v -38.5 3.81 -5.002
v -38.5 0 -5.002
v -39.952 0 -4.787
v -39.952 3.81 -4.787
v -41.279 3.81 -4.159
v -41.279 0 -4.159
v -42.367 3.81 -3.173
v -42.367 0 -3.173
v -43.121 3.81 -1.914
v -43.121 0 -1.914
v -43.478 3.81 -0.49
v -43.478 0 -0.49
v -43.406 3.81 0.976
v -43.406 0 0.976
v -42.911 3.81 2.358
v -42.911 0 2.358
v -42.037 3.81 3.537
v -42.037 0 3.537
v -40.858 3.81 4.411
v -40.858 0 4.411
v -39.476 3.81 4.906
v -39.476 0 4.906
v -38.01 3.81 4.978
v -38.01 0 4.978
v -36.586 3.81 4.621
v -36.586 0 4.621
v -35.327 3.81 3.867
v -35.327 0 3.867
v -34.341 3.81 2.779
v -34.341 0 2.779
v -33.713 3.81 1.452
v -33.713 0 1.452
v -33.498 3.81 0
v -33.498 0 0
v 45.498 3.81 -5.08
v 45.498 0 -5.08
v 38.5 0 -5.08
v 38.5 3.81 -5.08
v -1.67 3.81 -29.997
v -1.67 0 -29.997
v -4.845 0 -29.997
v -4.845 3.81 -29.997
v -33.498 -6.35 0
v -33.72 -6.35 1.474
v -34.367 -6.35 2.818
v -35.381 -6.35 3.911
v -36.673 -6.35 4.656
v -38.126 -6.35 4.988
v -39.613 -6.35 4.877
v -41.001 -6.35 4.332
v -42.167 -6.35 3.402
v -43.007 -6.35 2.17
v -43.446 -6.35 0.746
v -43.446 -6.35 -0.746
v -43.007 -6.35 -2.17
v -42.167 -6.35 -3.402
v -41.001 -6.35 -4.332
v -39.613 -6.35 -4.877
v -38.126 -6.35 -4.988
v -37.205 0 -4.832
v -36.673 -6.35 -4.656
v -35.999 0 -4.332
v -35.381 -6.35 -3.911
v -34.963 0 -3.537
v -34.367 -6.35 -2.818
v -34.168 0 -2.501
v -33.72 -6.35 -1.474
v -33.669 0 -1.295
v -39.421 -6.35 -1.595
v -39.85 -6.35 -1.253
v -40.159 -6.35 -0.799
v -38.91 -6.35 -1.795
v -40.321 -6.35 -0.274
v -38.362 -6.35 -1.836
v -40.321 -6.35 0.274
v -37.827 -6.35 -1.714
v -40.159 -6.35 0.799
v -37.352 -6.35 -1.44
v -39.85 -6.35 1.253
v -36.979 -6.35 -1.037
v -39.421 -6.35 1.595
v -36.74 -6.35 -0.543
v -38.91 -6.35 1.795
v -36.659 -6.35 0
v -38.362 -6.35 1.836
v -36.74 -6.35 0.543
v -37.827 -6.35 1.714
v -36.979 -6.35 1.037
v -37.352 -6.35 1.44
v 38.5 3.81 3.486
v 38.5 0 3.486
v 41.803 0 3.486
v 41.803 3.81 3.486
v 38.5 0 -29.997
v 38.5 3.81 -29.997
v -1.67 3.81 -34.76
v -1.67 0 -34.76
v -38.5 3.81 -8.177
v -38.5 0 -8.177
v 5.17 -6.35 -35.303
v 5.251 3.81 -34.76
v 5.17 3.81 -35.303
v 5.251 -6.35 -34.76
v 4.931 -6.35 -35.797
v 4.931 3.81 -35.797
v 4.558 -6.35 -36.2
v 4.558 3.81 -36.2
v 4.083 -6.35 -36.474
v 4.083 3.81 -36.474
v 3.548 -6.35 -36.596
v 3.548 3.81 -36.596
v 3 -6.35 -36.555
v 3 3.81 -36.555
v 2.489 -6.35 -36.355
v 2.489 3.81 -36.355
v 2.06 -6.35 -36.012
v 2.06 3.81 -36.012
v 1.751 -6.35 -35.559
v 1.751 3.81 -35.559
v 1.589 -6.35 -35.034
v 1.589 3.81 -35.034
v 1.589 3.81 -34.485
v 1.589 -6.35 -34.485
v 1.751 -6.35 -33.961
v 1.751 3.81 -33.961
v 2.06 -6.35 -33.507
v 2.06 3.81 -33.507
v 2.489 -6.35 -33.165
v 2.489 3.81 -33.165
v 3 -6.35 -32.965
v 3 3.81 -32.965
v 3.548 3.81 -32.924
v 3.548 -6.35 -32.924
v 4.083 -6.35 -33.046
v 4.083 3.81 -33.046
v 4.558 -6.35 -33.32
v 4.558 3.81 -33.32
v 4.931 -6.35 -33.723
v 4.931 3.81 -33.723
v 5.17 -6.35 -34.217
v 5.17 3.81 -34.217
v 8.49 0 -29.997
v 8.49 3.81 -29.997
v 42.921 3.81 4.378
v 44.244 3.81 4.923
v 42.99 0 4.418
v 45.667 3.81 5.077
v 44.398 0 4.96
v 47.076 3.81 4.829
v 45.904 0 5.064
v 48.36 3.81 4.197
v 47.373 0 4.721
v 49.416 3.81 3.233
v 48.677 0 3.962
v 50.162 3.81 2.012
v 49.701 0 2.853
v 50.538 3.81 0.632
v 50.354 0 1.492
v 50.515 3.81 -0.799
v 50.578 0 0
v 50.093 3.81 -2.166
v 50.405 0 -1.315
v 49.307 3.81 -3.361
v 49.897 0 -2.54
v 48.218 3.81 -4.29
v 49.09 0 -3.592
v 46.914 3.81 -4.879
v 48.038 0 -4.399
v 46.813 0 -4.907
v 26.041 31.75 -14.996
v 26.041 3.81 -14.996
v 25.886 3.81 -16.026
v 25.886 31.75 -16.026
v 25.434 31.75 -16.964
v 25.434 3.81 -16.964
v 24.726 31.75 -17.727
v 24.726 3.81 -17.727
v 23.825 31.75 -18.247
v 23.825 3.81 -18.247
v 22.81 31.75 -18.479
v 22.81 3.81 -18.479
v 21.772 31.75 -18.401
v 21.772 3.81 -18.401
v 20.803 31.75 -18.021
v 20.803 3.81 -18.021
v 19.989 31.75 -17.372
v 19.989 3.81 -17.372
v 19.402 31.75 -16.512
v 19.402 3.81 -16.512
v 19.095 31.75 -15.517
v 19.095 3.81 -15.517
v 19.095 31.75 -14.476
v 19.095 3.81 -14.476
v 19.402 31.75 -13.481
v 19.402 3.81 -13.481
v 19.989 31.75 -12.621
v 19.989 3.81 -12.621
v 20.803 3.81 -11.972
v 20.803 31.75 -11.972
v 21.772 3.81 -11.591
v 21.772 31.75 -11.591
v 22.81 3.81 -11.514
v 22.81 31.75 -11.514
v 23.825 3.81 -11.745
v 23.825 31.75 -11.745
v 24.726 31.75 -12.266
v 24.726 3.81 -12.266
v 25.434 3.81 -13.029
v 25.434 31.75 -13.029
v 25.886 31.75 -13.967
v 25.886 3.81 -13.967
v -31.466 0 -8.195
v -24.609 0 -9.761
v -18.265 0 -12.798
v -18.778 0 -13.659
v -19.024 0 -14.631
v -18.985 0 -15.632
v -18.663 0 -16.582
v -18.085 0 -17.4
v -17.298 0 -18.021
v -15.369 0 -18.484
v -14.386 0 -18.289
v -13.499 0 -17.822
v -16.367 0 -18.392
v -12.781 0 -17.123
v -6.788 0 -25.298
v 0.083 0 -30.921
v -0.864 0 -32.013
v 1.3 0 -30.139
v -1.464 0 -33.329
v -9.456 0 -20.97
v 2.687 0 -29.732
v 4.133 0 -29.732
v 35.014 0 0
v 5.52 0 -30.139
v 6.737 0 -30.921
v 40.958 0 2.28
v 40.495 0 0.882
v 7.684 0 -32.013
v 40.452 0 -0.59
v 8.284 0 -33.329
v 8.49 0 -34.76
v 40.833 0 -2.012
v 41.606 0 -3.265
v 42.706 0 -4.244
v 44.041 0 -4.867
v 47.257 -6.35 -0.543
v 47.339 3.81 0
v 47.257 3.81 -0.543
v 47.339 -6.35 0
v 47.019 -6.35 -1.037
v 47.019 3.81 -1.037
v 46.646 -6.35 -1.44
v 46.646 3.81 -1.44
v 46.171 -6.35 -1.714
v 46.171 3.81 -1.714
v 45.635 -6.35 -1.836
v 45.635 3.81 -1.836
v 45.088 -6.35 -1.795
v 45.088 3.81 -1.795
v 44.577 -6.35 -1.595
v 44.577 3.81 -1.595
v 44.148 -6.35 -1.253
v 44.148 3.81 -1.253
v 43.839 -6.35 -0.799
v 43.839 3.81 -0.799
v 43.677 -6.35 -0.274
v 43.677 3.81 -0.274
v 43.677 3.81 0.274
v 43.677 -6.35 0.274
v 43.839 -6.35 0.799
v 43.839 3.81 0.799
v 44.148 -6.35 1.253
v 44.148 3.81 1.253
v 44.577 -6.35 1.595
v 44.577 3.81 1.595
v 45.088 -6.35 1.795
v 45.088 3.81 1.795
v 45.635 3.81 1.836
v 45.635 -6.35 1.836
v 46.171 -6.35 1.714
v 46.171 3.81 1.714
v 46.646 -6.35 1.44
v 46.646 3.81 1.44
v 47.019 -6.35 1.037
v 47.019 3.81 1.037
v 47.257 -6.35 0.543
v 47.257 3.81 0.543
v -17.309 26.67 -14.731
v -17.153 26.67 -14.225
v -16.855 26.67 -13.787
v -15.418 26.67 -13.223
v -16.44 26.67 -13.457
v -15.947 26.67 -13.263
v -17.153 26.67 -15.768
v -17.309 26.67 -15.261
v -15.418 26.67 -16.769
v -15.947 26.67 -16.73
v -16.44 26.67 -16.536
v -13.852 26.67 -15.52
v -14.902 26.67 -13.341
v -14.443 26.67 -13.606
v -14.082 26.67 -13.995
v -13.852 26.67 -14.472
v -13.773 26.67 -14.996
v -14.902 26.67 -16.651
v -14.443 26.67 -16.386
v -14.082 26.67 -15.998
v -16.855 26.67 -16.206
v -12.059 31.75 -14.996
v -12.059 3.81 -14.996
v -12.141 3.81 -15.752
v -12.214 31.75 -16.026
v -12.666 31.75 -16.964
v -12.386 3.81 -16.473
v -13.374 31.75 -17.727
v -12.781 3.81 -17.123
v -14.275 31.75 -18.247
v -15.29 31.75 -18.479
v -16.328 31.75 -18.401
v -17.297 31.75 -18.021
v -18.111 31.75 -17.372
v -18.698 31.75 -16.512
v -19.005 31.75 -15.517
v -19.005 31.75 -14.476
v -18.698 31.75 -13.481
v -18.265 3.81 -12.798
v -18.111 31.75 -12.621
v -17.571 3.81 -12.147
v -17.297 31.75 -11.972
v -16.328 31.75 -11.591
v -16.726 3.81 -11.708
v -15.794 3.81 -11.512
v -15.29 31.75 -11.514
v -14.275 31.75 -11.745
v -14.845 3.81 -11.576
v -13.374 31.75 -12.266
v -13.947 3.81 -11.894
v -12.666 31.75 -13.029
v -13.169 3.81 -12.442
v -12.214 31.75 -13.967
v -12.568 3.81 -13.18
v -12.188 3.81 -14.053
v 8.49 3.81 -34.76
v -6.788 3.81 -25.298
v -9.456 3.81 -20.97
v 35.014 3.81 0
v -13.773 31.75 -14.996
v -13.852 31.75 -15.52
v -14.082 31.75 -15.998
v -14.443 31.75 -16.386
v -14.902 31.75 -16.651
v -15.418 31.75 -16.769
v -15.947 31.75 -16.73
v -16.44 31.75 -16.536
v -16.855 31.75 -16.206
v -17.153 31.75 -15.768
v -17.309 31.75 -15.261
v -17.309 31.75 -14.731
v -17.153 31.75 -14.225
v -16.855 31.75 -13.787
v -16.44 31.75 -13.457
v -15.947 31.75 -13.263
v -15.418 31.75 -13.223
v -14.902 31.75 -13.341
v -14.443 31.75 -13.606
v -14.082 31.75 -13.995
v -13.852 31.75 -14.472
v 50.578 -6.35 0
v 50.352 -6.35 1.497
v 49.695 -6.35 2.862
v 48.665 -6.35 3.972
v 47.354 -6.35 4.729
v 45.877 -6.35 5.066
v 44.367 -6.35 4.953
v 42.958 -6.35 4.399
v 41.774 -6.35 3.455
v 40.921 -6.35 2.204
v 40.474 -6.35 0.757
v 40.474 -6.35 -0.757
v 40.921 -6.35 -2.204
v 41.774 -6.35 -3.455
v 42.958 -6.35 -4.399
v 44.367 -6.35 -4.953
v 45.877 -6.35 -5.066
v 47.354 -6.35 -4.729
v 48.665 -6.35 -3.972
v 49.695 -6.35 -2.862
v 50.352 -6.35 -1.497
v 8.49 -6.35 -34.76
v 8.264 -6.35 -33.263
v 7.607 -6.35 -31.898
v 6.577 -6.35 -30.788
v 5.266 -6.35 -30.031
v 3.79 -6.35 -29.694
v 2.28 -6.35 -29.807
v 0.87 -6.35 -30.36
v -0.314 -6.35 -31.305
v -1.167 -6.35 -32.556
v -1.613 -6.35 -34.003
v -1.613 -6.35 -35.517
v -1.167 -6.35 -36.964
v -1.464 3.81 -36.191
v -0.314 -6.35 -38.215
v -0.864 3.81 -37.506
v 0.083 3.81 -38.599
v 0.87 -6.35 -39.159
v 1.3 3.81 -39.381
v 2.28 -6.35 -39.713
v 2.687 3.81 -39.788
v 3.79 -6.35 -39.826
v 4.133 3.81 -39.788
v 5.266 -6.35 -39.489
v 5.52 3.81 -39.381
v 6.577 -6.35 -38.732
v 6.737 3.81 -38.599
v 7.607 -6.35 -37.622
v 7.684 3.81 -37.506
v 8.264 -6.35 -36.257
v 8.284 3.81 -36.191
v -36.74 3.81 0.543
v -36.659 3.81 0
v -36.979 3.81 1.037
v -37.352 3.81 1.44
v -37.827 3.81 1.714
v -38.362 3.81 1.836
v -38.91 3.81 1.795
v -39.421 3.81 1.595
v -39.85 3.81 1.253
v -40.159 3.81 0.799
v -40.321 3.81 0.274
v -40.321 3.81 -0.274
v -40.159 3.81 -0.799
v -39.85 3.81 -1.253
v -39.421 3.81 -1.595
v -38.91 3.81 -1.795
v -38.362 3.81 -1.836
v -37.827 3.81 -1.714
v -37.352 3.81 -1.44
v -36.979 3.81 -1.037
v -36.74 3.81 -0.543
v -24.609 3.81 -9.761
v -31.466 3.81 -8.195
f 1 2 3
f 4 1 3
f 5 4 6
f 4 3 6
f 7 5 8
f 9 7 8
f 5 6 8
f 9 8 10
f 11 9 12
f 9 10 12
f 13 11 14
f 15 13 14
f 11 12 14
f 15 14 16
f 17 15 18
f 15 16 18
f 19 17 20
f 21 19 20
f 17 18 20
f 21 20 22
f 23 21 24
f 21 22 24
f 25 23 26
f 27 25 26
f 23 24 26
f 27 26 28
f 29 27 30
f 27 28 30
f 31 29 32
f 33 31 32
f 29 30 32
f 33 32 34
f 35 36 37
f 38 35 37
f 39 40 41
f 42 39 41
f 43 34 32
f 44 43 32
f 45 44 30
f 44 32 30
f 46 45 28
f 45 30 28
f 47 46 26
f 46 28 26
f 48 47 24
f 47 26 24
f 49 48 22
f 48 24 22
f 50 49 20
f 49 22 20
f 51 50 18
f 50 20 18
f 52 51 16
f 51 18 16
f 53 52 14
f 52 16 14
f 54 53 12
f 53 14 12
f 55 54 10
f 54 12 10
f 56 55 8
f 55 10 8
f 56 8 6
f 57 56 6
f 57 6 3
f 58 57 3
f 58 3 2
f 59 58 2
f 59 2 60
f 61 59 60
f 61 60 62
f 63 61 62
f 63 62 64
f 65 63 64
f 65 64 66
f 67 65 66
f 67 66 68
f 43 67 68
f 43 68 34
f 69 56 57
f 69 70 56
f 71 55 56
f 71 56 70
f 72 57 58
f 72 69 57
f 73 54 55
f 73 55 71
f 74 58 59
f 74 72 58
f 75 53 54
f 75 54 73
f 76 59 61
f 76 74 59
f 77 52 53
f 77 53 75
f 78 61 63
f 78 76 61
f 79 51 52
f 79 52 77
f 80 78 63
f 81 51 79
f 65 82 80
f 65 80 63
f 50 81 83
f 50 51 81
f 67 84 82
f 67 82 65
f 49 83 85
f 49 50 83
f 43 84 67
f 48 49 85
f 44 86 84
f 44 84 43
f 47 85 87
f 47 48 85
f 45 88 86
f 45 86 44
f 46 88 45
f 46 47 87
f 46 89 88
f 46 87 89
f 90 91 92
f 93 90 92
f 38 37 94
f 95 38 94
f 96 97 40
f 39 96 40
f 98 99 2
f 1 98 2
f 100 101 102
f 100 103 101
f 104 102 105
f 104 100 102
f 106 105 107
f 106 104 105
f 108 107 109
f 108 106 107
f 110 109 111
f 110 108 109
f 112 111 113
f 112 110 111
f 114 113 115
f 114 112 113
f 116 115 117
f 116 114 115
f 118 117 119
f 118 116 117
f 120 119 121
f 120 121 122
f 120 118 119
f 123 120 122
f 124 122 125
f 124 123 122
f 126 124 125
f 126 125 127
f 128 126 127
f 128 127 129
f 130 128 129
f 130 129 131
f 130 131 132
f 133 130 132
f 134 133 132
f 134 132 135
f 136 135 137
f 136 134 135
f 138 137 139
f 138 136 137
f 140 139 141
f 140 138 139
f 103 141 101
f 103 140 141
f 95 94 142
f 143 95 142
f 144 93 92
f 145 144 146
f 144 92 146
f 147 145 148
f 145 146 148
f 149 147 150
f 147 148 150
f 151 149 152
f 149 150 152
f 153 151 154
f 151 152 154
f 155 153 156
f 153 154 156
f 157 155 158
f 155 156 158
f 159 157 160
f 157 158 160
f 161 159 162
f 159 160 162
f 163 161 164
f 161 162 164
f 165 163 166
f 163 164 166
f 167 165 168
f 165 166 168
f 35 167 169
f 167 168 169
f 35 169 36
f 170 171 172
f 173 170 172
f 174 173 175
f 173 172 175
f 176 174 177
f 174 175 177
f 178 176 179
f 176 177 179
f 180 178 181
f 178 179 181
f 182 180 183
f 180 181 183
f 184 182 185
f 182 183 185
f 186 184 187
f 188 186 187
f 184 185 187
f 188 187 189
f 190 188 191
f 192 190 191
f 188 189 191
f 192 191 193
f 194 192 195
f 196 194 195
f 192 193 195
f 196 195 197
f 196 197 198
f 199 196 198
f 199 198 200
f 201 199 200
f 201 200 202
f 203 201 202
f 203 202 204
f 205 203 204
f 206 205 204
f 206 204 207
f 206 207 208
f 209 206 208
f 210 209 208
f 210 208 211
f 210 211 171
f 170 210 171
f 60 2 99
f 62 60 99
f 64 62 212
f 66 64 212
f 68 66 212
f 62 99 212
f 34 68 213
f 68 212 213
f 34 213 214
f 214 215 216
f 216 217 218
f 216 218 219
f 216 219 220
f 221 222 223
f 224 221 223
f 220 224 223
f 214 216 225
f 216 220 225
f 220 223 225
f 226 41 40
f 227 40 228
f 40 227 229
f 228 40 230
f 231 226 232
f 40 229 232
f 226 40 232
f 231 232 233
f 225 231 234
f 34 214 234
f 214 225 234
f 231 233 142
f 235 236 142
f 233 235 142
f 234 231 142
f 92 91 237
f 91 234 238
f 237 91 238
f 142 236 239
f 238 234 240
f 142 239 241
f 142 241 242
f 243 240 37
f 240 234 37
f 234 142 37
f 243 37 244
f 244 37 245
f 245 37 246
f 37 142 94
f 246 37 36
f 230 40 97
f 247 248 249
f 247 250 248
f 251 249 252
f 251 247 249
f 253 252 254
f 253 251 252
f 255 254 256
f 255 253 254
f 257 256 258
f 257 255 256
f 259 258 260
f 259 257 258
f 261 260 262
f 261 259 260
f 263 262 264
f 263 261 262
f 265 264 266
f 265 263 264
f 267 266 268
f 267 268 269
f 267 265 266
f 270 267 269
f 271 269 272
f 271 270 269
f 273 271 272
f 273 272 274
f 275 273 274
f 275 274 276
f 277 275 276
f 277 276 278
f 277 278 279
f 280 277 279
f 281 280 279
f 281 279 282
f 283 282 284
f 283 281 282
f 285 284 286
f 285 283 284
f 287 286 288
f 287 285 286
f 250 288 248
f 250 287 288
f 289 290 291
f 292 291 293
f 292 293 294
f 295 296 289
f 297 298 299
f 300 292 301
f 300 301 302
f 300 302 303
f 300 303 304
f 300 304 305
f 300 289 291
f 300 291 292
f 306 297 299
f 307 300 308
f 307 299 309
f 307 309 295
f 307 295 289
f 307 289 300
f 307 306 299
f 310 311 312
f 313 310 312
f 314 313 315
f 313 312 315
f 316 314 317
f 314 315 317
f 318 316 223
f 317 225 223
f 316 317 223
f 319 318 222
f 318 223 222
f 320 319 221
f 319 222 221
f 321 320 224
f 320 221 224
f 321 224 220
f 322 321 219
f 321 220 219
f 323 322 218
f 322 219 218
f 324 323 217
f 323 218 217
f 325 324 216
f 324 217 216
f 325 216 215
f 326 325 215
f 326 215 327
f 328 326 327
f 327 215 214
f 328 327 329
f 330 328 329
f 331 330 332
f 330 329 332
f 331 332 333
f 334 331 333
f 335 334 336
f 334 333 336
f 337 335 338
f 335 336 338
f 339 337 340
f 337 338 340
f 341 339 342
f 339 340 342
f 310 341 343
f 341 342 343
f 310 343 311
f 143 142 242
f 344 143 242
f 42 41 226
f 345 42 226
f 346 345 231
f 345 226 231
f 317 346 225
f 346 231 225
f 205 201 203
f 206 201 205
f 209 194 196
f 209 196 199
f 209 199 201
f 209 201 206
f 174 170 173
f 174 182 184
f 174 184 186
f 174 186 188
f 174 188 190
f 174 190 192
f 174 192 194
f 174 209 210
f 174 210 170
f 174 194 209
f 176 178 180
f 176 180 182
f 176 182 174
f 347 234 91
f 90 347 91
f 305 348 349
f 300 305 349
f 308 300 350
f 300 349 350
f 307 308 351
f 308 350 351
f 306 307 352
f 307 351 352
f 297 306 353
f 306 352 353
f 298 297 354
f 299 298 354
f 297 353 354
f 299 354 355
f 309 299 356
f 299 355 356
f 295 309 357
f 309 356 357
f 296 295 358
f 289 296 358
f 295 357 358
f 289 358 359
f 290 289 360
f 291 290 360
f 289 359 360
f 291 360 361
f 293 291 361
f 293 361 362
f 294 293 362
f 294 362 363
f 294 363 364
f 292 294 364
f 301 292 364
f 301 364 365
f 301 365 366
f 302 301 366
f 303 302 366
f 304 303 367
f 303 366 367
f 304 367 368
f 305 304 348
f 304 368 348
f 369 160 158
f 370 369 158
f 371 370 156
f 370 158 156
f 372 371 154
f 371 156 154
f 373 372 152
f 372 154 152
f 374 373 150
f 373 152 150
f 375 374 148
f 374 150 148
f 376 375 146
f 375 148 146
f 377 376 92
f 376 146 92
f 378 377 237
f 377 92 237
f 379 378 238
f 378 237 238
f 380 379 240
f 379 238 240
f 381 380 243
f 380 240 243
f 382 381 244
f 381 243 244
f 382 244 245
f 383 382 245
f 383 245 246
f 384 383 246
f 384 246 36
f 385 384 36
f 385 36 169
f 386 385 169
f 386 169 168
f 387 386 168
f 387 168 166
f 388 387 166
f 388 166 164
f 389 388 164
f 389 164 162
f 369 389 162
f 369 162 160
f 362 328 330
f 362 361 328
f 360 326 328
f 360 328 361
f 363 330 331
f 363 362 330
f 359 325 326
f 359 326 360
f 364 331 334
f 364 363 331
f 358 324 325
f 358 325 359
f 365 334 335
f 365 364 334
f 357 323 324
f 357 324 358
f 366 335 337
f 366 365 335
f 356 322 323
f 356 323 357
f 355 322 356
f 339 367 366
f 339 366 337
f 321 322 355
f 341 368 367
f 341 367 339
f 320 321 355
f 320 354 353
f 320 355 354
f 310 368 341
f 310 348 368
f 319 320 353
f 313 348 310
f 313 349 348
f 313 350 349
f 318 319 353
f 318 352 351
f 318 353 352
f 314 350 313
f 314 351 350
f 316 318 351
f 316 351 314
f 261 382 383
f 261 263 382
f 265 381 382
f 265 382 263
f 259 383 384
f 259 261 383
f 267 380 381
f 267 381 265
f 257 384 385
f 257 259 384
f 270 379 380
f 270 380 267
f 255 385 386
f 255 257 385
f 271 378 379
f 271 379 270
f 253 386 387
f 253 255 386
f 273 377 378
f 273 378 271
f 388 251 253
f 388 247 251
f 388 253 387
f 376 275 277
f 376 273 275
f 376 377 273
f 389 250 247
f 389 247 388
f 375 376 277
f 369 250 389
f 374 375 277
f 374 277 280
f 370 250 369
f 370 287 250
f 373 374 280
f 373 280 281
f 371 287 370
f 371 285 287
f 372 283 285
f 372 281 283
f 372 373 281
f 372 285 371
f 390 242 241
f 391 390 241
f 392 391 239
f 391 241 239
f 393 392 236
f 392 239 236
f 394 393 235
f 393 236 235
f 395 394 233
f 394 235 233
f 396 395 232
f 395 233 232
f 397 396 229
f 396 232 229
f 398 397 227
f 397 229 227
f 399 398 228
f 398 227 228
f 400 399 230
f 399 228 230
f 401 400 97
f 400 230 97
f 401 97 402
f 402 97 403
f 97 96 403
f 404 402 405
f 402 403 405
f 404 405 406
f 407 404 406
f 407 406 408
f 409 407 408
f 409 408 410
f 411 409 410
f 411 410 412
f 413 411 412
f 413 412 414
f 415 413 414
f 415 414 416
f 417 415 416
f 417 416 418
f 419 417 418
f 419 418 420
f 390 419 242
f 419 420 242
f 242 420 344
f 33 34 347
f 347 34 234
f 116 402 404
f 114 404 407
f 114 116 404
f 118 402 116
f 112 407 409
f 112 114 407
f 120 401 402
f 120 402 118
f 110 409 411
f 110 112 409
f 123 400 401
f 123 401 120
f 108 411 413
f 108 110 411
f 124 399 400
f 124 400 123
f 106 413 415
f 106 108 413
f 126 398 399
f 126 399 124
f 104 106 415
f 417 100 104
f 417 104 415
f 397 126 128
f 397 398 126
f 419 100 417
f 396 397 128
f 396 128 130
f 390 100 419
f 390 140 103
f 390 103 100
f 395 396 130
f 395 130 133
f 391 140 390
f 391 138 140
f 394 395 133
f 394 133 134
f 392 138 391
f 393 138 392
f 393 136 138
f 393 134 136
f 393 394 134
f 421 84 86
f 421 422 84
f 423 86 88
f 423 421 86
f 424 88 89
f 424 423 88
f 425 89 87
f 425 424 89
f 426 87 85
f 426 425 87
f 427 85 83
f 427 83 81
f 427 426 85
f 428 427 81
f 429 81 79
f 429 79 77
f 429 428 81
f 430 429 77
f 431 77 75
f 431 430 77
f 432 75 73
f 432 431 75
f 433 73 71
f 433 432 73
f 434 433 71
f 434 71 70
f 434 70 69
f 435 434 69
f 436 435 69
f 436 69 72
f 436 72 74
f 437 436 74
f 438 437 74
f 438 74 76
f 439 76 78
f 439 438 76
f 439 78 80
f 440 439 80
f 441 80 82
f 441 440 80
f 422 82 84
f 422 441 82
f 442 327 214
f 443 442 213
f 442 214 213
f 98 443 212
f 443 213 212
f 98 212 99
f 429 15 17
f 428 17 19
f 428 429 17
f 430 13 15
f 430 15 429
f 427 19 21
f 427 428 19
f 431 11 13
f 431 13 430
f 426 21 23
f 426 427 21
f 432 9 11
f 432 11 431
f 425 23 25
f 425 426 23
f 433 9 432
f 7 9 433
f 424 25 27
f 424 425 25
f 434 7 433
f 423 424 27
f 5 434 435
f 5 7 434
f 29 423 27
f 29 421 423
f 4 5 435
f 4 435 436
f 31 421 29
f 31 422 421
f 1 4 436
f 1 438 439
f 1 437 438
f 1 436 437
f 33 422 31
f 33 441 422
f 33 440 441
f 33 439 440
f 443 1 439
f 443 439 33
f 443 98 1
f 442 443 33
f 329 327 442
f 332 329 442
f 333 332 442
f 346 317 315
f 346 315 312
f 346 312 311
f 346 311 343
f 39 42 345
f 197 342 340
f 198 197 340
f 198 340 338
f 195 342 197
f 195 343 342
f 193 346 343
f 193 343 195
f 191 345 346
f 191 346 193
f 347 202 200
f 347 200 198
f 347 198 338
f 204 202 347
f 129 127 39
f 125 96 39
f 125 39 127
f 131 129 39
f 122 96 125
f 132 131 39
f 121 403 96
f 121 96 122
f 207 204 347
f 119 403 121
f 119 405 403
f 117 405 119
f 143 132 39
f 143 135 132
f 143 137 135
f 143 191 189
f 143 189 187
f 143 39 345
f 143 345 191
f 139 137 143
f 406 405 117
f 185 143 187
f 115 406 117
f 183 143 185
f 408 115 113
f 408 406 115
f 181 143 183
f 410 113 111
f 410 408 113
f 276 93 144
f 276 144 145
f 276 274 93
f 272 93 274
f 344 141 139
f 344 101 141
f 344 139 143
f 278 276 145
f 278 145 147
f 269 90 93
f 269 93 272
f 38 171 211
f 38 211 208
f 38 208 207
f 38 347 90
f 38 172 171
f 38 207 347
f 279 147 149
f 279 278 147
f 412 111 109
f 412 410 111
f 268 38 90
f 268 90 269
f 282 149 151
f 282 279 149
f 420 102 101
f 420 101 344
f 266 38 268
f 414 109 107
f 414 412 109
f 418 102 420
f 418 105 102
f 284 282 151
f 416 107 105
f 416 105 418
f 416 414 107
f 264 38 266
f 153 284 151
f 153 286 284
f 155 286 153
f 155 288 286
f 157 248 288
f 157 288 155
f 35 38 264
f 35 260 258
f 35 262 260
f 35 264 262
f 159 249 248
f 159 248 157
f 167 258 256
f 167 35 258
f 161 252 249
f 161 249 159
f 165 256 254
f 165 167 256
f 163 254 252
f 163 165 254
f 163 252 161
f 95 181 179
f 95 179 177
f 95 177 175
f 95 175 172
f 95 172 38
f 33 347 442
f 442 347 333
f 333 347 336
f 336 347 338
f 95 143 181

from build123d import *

# Parameters (mm, degrees)
SKETCH1_R           = 1.8415
BOSS_EXTRUDE1_DEPTH = 3.81
CUT_EXTRUDE2_DEPTH  = 3.81
SKETCH2_R           = 3.4925
BOSS_EXTRUDE2_DEPTH = 31.75
SKETCH4_R           = 5.001975
SKETCH4_R_2         = 1.8415
SKETCH4_R_3         = 5.08
BOSS_EXTRUDE3_DEPTH = 6.35
SKETCH6_R           = 1.778
CUT_EXTRUDE3_DEPTH  = 5.08


with BuildPart() as part:
    # Sketch1 → Boss-Extrude1 (new body)
    with BuildSketch(Plane(origin=(0, 0, 0), x_dir=(1, 0, 0), z_dir=(0, 1, 0))):
        with BuildLine():
            Line((35.013825, 0), (38.50005, -3.486225))
            Line((38.50005, -3.486225), (41.802802741, -3.486225))
            ThreePointArc((41.802802741, -3.486225), (50.162319809, -2.012011059), (45.49775, 5.08))
            Line((45.49775, 5.08), (38.50005, 5.08))
            Line((38.50005, 5.08), (38.50005, 29.9974))
            Line((38.50005, 29.9974), (8.48995, 29.9974))
            Line((8.48995, 29.9974), (8.48995, 34.7599))
            ThreePointArc((8.48995, 34.7599), (3.40995, 39.8399), (-1.67005, 34.7599))
            Line((-1.67005, 34.7599), (-1.67005, 29.9974))
            Line((-1.67005, 29.9974), (-38.50005, 29.9974))
            Line((-38.50005, 29.9974), (-38.50005, 5.001975))
            ThreePointArc((-38.50005, 5.001975), (-42.036980442, -3.536930442), (-33.498075, 0))
            Line((-33.498075, 0), (35.013825, 0))
        make_face()
        with Locations((3.40995, 34.7599)):
            Circle(SKETCH1_R, mode=Mode.SUBTRACT)
        with Locations((45.49775, 0)):
            Circle(SKETCH1_R, mode=Mode.SUBTRACT)
        with Locations((-38.50005, 0)):
            Circle(SKETCH1_R, mode=Mode.SUBTRACT)
    extrude(amount=BOSS_EXTRUDE1_DEPTH)

    # Sketch3 → Cut-Extrude2 (cut)
    with BuildSketch(Plane(origin=(0, 0, 0), x_dir=(1, 0, 0), z_dir=(0, 1, 0))):
        with BuildLine():
            Line((-38.50005, 8.176975), (-38.50005, 29.9974))
            Line((-38.50005, 29.9974), (-4.84505, 29.9974))
            ThreePointArc((-4.84505, 29.9974), (-17.79061216, 13.099833084), (-38.50005, 8.176975))
        make_face()
    extrude(amount=CUT_EXTRUDE2_DEPTH, mode=Mode.SUBTRACT)

    # Sketch2 → Boss-Extrude2 (add)
    with BuildSketch(Plane(origin=(0, 0, 0), x_dir=(1, 0, 0), z_dir=(0, 1, 0))):
        with Locations((-15.55115, 14.9963886)):
            Circle(SKETCH2_R)
        with Locations((22.54885, 14.9963886)):
            Circle(SKETCH2_R)
    extrude(amount=BOSS_EXTRUDE2_DEPTH)

    # Sketch4 → Boss-Extrude3 (add)
    with BuildSketch(Plane.XZ):
        with Locations((-38.50005, 0)):
            Circle(SKETCH4_R)
        with Locations((-38.50005, 0)):
            Circle(SKETCH4_R_2, mode=Mode.SUBTRACT)
        with Locations((45.49775, 0)):
            Circle(SKETCH4_R_3)
        with Locations((45.49775, 0)):
            Circle(SKETCH4_R_2, mode=Mode.SUBTRACT)
        with Locations((3.40995, -34.7599)):
            Circle(SKETCH4_R_3)
        with Locations((3.40995, -34.7599)):
            Circle(SKETCH4_R_2, mode=Mode.SUBTRACT)
    extrude(amount=BOSS_EXTRUDE3_DEPTH)

    # Sketch6 → Cut-Extrude3 (cut)
    with BuildSketch(Plane(origin=(0, 31.75, 0), x_dir=(1, 0, 0), z_dir=(0, 1, 0))):
        with Locations((-15.55115, 14.9963886)):
            Circle(SKETCH6_R)
    extrude(amount=-CUT_EXTRUDE3_DEPTH, mode=Mode.SUBTRACT)


solid = part.part
